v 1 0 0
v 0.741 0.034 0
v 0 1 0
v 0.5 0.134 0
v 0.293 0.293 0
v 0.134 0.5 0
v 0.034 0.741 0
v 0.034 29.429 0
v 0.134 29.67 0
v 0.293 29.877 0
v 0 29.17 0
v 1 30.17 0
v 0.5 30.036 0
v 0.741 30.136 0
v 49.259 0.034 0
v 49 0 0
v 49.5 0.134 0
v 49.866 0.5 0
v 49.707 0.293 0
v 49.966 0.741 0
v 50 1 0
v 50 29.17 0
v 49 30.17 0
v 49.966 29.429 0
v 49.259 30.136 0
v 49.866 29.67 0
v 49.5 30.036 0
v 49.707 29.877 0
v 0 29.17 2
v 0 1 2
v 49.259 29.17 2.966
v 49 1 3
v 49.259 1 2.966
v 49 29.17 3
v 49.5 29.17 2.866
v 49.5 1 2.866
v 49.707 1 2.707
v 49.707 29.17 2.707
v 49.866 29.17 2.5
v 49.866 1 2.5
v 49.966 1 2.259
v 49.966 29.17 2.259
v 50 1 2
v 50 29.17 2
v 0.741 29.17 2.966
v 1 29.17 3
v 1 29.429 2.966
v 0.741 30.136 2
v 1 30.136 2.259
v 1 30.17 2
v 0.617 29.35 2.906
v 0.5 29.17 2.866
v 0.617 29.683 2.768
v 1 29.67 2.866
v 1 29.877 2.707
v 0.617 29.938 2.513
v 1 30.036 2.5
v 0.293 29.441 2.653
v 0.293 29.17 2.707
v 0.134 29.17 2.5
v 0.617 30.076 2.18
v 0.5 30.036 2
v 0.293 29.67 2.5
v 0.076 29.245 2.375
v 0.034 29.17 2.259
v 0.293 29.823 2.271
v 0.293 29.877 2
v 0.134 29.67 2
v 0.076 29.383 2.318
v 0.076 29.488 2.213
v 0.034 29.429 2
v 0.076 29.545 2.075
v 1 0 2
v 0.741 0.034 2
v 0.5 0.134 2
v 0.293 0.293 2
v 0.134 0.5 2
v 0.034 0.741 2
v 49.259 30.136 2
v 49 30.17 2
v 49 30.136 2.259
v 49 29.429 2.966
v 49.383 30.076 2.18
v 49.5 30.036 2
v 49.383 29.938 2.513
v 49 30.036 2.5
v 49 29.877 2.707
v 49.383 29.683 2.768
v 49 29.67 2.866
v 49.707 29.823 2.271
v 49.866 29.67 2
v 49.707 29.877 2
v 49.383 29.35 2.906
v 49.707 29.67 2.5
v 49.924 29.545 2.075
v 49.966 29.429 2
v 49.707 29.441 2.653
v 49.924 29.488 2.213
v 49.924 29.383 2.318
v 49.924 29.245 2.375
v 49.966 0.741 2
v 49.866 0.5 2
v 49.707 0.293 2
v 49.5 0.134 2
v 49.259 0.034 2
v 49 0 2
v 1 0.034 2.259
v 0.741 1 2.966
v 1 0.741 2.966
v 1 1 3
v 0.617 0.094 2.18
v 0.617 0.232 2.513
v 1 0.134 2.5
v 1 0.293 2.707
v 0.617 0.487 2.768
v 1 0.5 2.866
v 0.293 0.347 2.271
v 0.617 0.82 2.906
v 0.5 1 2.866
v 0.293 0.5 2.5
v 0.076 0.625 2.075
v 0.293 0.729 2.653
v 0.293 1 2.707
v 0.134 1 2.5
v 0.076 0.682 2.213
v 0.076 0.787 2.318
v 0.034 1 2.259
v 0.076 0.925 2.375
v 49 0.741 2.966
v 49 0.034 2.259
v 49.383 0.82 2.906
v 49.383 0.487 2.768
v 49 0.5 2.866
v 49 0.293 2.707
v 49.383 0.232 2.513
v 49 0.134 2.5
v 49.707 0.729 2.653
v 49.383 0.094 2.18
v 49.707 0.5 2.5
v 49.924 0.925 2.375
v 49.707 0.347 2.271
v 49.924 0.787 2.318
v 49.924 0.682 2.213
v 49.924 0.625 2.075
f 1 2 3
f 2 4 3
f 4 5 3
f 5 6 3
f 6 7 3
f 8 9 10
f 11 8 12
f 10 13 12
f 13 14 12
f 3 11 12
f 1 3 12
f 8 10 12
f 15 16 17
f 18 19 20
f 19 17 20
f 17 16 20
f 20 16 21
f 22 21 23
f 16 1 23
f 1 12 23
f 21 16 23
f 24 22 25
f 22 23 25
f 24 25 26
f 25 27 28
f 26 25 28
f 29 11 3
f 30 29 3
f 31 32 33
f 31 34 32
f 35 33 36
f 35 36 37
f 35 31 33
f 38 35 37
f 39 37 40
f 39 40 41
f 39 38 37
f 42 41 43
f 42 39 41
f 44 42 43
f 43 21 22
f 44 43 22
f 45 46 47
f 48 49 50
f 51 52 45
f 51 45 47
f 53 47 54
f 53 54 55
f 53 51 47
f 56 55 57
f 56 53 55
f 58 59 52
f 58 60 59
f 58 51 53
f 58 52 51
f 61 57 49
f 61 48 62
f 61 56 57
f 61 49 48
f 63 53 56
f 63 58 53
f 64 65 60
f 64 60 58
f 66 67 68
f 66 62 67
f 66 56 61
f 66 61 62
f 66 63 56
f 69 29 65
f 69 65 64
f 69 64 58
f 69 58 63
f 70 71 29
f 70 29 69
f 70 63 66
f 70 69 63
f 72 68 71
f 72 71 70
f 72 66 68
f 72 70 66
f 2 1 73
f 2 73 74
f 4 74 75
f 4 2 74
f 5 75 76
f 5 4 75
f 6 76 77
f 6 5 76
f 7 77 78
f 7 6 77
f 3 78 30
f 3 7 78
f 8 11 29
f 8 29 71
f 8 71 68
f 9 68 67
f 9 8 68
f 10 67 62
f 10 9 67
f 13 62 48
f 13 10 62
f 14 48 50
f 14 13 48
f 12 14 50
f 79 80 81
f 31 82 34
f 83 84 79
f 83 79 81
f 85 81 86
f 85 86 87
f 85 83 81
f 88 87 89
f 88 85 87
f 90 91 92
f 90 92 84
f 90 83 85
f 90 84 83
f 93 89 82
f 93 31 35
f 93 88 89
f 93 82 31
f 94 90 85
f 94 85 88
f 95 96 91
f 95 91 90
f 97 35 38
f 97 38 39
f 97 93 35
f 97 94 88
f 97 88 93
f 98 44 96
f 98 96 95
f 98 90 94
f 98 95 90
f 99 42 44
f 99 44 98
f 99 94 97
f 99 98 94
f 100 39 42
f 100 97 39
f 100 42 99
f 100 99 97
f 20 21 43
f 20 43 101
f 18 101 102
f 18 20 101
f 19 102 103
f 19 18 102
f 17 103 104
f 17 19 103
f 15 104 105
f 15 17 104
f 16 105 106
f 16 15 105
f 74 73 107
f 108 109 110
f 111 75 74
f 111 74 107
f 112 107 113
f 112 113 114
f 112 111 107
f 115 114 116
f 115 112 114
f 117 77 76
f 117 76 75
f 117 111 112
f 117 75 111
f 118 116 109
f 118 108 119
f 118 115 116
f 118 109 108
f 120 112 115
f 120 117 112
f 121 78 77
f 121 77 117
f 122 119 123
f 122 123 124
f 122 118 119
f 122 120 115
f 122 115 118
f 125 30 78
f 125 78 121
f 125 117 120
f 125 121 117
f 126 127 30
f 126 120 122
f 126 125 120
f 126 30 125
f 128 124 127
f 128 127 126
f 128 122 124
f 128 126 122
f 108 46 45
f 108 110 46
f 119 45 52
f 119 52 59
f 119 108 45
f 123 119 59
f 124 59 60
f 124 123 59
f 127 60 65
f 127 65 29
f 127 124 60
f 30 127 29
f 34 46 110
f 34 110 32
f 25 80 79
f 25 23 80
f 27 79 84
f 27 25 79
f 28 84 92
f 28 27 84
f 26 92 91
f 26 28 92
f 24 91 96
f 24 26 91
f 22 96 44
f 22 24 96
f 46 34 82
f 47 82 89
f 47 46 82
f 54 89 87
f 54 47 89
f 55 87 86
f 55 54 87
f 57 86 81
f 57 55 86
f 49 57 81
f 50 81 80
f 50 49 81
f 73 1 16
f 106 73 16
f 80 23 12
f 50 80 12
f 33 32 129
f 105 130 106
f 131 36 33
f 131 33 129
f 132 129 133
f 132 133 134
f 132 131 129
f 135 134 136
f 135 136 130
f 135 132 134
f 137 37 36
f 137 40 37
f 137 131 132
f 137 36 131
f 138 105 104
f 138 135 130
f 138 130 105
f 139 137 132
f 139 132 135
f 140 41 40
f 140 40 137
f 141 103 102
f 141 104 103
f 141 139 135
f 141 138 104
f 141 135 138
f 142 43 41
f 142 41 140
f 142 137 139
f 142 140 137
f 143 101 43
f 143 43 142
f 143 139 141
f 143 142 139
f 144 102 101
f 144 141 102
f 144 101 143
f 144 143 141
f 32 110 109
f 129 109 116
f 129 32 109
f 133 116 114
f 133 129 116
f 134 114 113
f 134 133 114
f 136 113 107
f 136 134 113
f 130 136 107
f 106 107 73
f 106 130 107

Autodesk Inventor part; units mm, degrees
ref_plane "YZ Plane" through (0, 0, 0) normal (1, 0, 0) x (0, 1, 0)
ref_plane "XZ Plane" through (0, 0, 0) normal (0, 1, 0) x (-1, 0, 0)
ref_plane "XY Plane" through (0, 0, 0) normal (0, 0, 1) x (1, 0, 0)
sketch "草圖1" plane through (0, 0, 0) normal (0, 0, 1) x (1, 0, 0)
  line L0 (0, 0) -> (50, 0)
  line L1 (50, 0) -> (50, 30.17)
  line L2 (50, 30.17) -> (0, 30.17)
  line L3 (0, 30.17) -> (0, 0)
  dimension "d0" = 30.17
  dimension "d1" = 50
extrude "擠出1" add sketch "草圖1" along normal blind 3
fillet "圓角1" radius 1 4 edges at (25, 0, 3) (25, 30.17, 3) (50, 15.085, 3) (0, 15.085, 3)
fillet "圓角2" radius 1 2 edges at (0, 0, 1) (0.2929, 0.2929, 2.7071)
fillet "圓角3" radius 1 2 edges at (0.2929, 29.8771, 2.7071) (0, 30.17, 1)
fillet "圓角4" radius 1 4 edges at (49.7071, 0.2929, 2.7071) (50, 0, 1) (49.7071, 29.8771, 2.7071) (50, 30.17, 1)
properties part number "時鐘底座"
